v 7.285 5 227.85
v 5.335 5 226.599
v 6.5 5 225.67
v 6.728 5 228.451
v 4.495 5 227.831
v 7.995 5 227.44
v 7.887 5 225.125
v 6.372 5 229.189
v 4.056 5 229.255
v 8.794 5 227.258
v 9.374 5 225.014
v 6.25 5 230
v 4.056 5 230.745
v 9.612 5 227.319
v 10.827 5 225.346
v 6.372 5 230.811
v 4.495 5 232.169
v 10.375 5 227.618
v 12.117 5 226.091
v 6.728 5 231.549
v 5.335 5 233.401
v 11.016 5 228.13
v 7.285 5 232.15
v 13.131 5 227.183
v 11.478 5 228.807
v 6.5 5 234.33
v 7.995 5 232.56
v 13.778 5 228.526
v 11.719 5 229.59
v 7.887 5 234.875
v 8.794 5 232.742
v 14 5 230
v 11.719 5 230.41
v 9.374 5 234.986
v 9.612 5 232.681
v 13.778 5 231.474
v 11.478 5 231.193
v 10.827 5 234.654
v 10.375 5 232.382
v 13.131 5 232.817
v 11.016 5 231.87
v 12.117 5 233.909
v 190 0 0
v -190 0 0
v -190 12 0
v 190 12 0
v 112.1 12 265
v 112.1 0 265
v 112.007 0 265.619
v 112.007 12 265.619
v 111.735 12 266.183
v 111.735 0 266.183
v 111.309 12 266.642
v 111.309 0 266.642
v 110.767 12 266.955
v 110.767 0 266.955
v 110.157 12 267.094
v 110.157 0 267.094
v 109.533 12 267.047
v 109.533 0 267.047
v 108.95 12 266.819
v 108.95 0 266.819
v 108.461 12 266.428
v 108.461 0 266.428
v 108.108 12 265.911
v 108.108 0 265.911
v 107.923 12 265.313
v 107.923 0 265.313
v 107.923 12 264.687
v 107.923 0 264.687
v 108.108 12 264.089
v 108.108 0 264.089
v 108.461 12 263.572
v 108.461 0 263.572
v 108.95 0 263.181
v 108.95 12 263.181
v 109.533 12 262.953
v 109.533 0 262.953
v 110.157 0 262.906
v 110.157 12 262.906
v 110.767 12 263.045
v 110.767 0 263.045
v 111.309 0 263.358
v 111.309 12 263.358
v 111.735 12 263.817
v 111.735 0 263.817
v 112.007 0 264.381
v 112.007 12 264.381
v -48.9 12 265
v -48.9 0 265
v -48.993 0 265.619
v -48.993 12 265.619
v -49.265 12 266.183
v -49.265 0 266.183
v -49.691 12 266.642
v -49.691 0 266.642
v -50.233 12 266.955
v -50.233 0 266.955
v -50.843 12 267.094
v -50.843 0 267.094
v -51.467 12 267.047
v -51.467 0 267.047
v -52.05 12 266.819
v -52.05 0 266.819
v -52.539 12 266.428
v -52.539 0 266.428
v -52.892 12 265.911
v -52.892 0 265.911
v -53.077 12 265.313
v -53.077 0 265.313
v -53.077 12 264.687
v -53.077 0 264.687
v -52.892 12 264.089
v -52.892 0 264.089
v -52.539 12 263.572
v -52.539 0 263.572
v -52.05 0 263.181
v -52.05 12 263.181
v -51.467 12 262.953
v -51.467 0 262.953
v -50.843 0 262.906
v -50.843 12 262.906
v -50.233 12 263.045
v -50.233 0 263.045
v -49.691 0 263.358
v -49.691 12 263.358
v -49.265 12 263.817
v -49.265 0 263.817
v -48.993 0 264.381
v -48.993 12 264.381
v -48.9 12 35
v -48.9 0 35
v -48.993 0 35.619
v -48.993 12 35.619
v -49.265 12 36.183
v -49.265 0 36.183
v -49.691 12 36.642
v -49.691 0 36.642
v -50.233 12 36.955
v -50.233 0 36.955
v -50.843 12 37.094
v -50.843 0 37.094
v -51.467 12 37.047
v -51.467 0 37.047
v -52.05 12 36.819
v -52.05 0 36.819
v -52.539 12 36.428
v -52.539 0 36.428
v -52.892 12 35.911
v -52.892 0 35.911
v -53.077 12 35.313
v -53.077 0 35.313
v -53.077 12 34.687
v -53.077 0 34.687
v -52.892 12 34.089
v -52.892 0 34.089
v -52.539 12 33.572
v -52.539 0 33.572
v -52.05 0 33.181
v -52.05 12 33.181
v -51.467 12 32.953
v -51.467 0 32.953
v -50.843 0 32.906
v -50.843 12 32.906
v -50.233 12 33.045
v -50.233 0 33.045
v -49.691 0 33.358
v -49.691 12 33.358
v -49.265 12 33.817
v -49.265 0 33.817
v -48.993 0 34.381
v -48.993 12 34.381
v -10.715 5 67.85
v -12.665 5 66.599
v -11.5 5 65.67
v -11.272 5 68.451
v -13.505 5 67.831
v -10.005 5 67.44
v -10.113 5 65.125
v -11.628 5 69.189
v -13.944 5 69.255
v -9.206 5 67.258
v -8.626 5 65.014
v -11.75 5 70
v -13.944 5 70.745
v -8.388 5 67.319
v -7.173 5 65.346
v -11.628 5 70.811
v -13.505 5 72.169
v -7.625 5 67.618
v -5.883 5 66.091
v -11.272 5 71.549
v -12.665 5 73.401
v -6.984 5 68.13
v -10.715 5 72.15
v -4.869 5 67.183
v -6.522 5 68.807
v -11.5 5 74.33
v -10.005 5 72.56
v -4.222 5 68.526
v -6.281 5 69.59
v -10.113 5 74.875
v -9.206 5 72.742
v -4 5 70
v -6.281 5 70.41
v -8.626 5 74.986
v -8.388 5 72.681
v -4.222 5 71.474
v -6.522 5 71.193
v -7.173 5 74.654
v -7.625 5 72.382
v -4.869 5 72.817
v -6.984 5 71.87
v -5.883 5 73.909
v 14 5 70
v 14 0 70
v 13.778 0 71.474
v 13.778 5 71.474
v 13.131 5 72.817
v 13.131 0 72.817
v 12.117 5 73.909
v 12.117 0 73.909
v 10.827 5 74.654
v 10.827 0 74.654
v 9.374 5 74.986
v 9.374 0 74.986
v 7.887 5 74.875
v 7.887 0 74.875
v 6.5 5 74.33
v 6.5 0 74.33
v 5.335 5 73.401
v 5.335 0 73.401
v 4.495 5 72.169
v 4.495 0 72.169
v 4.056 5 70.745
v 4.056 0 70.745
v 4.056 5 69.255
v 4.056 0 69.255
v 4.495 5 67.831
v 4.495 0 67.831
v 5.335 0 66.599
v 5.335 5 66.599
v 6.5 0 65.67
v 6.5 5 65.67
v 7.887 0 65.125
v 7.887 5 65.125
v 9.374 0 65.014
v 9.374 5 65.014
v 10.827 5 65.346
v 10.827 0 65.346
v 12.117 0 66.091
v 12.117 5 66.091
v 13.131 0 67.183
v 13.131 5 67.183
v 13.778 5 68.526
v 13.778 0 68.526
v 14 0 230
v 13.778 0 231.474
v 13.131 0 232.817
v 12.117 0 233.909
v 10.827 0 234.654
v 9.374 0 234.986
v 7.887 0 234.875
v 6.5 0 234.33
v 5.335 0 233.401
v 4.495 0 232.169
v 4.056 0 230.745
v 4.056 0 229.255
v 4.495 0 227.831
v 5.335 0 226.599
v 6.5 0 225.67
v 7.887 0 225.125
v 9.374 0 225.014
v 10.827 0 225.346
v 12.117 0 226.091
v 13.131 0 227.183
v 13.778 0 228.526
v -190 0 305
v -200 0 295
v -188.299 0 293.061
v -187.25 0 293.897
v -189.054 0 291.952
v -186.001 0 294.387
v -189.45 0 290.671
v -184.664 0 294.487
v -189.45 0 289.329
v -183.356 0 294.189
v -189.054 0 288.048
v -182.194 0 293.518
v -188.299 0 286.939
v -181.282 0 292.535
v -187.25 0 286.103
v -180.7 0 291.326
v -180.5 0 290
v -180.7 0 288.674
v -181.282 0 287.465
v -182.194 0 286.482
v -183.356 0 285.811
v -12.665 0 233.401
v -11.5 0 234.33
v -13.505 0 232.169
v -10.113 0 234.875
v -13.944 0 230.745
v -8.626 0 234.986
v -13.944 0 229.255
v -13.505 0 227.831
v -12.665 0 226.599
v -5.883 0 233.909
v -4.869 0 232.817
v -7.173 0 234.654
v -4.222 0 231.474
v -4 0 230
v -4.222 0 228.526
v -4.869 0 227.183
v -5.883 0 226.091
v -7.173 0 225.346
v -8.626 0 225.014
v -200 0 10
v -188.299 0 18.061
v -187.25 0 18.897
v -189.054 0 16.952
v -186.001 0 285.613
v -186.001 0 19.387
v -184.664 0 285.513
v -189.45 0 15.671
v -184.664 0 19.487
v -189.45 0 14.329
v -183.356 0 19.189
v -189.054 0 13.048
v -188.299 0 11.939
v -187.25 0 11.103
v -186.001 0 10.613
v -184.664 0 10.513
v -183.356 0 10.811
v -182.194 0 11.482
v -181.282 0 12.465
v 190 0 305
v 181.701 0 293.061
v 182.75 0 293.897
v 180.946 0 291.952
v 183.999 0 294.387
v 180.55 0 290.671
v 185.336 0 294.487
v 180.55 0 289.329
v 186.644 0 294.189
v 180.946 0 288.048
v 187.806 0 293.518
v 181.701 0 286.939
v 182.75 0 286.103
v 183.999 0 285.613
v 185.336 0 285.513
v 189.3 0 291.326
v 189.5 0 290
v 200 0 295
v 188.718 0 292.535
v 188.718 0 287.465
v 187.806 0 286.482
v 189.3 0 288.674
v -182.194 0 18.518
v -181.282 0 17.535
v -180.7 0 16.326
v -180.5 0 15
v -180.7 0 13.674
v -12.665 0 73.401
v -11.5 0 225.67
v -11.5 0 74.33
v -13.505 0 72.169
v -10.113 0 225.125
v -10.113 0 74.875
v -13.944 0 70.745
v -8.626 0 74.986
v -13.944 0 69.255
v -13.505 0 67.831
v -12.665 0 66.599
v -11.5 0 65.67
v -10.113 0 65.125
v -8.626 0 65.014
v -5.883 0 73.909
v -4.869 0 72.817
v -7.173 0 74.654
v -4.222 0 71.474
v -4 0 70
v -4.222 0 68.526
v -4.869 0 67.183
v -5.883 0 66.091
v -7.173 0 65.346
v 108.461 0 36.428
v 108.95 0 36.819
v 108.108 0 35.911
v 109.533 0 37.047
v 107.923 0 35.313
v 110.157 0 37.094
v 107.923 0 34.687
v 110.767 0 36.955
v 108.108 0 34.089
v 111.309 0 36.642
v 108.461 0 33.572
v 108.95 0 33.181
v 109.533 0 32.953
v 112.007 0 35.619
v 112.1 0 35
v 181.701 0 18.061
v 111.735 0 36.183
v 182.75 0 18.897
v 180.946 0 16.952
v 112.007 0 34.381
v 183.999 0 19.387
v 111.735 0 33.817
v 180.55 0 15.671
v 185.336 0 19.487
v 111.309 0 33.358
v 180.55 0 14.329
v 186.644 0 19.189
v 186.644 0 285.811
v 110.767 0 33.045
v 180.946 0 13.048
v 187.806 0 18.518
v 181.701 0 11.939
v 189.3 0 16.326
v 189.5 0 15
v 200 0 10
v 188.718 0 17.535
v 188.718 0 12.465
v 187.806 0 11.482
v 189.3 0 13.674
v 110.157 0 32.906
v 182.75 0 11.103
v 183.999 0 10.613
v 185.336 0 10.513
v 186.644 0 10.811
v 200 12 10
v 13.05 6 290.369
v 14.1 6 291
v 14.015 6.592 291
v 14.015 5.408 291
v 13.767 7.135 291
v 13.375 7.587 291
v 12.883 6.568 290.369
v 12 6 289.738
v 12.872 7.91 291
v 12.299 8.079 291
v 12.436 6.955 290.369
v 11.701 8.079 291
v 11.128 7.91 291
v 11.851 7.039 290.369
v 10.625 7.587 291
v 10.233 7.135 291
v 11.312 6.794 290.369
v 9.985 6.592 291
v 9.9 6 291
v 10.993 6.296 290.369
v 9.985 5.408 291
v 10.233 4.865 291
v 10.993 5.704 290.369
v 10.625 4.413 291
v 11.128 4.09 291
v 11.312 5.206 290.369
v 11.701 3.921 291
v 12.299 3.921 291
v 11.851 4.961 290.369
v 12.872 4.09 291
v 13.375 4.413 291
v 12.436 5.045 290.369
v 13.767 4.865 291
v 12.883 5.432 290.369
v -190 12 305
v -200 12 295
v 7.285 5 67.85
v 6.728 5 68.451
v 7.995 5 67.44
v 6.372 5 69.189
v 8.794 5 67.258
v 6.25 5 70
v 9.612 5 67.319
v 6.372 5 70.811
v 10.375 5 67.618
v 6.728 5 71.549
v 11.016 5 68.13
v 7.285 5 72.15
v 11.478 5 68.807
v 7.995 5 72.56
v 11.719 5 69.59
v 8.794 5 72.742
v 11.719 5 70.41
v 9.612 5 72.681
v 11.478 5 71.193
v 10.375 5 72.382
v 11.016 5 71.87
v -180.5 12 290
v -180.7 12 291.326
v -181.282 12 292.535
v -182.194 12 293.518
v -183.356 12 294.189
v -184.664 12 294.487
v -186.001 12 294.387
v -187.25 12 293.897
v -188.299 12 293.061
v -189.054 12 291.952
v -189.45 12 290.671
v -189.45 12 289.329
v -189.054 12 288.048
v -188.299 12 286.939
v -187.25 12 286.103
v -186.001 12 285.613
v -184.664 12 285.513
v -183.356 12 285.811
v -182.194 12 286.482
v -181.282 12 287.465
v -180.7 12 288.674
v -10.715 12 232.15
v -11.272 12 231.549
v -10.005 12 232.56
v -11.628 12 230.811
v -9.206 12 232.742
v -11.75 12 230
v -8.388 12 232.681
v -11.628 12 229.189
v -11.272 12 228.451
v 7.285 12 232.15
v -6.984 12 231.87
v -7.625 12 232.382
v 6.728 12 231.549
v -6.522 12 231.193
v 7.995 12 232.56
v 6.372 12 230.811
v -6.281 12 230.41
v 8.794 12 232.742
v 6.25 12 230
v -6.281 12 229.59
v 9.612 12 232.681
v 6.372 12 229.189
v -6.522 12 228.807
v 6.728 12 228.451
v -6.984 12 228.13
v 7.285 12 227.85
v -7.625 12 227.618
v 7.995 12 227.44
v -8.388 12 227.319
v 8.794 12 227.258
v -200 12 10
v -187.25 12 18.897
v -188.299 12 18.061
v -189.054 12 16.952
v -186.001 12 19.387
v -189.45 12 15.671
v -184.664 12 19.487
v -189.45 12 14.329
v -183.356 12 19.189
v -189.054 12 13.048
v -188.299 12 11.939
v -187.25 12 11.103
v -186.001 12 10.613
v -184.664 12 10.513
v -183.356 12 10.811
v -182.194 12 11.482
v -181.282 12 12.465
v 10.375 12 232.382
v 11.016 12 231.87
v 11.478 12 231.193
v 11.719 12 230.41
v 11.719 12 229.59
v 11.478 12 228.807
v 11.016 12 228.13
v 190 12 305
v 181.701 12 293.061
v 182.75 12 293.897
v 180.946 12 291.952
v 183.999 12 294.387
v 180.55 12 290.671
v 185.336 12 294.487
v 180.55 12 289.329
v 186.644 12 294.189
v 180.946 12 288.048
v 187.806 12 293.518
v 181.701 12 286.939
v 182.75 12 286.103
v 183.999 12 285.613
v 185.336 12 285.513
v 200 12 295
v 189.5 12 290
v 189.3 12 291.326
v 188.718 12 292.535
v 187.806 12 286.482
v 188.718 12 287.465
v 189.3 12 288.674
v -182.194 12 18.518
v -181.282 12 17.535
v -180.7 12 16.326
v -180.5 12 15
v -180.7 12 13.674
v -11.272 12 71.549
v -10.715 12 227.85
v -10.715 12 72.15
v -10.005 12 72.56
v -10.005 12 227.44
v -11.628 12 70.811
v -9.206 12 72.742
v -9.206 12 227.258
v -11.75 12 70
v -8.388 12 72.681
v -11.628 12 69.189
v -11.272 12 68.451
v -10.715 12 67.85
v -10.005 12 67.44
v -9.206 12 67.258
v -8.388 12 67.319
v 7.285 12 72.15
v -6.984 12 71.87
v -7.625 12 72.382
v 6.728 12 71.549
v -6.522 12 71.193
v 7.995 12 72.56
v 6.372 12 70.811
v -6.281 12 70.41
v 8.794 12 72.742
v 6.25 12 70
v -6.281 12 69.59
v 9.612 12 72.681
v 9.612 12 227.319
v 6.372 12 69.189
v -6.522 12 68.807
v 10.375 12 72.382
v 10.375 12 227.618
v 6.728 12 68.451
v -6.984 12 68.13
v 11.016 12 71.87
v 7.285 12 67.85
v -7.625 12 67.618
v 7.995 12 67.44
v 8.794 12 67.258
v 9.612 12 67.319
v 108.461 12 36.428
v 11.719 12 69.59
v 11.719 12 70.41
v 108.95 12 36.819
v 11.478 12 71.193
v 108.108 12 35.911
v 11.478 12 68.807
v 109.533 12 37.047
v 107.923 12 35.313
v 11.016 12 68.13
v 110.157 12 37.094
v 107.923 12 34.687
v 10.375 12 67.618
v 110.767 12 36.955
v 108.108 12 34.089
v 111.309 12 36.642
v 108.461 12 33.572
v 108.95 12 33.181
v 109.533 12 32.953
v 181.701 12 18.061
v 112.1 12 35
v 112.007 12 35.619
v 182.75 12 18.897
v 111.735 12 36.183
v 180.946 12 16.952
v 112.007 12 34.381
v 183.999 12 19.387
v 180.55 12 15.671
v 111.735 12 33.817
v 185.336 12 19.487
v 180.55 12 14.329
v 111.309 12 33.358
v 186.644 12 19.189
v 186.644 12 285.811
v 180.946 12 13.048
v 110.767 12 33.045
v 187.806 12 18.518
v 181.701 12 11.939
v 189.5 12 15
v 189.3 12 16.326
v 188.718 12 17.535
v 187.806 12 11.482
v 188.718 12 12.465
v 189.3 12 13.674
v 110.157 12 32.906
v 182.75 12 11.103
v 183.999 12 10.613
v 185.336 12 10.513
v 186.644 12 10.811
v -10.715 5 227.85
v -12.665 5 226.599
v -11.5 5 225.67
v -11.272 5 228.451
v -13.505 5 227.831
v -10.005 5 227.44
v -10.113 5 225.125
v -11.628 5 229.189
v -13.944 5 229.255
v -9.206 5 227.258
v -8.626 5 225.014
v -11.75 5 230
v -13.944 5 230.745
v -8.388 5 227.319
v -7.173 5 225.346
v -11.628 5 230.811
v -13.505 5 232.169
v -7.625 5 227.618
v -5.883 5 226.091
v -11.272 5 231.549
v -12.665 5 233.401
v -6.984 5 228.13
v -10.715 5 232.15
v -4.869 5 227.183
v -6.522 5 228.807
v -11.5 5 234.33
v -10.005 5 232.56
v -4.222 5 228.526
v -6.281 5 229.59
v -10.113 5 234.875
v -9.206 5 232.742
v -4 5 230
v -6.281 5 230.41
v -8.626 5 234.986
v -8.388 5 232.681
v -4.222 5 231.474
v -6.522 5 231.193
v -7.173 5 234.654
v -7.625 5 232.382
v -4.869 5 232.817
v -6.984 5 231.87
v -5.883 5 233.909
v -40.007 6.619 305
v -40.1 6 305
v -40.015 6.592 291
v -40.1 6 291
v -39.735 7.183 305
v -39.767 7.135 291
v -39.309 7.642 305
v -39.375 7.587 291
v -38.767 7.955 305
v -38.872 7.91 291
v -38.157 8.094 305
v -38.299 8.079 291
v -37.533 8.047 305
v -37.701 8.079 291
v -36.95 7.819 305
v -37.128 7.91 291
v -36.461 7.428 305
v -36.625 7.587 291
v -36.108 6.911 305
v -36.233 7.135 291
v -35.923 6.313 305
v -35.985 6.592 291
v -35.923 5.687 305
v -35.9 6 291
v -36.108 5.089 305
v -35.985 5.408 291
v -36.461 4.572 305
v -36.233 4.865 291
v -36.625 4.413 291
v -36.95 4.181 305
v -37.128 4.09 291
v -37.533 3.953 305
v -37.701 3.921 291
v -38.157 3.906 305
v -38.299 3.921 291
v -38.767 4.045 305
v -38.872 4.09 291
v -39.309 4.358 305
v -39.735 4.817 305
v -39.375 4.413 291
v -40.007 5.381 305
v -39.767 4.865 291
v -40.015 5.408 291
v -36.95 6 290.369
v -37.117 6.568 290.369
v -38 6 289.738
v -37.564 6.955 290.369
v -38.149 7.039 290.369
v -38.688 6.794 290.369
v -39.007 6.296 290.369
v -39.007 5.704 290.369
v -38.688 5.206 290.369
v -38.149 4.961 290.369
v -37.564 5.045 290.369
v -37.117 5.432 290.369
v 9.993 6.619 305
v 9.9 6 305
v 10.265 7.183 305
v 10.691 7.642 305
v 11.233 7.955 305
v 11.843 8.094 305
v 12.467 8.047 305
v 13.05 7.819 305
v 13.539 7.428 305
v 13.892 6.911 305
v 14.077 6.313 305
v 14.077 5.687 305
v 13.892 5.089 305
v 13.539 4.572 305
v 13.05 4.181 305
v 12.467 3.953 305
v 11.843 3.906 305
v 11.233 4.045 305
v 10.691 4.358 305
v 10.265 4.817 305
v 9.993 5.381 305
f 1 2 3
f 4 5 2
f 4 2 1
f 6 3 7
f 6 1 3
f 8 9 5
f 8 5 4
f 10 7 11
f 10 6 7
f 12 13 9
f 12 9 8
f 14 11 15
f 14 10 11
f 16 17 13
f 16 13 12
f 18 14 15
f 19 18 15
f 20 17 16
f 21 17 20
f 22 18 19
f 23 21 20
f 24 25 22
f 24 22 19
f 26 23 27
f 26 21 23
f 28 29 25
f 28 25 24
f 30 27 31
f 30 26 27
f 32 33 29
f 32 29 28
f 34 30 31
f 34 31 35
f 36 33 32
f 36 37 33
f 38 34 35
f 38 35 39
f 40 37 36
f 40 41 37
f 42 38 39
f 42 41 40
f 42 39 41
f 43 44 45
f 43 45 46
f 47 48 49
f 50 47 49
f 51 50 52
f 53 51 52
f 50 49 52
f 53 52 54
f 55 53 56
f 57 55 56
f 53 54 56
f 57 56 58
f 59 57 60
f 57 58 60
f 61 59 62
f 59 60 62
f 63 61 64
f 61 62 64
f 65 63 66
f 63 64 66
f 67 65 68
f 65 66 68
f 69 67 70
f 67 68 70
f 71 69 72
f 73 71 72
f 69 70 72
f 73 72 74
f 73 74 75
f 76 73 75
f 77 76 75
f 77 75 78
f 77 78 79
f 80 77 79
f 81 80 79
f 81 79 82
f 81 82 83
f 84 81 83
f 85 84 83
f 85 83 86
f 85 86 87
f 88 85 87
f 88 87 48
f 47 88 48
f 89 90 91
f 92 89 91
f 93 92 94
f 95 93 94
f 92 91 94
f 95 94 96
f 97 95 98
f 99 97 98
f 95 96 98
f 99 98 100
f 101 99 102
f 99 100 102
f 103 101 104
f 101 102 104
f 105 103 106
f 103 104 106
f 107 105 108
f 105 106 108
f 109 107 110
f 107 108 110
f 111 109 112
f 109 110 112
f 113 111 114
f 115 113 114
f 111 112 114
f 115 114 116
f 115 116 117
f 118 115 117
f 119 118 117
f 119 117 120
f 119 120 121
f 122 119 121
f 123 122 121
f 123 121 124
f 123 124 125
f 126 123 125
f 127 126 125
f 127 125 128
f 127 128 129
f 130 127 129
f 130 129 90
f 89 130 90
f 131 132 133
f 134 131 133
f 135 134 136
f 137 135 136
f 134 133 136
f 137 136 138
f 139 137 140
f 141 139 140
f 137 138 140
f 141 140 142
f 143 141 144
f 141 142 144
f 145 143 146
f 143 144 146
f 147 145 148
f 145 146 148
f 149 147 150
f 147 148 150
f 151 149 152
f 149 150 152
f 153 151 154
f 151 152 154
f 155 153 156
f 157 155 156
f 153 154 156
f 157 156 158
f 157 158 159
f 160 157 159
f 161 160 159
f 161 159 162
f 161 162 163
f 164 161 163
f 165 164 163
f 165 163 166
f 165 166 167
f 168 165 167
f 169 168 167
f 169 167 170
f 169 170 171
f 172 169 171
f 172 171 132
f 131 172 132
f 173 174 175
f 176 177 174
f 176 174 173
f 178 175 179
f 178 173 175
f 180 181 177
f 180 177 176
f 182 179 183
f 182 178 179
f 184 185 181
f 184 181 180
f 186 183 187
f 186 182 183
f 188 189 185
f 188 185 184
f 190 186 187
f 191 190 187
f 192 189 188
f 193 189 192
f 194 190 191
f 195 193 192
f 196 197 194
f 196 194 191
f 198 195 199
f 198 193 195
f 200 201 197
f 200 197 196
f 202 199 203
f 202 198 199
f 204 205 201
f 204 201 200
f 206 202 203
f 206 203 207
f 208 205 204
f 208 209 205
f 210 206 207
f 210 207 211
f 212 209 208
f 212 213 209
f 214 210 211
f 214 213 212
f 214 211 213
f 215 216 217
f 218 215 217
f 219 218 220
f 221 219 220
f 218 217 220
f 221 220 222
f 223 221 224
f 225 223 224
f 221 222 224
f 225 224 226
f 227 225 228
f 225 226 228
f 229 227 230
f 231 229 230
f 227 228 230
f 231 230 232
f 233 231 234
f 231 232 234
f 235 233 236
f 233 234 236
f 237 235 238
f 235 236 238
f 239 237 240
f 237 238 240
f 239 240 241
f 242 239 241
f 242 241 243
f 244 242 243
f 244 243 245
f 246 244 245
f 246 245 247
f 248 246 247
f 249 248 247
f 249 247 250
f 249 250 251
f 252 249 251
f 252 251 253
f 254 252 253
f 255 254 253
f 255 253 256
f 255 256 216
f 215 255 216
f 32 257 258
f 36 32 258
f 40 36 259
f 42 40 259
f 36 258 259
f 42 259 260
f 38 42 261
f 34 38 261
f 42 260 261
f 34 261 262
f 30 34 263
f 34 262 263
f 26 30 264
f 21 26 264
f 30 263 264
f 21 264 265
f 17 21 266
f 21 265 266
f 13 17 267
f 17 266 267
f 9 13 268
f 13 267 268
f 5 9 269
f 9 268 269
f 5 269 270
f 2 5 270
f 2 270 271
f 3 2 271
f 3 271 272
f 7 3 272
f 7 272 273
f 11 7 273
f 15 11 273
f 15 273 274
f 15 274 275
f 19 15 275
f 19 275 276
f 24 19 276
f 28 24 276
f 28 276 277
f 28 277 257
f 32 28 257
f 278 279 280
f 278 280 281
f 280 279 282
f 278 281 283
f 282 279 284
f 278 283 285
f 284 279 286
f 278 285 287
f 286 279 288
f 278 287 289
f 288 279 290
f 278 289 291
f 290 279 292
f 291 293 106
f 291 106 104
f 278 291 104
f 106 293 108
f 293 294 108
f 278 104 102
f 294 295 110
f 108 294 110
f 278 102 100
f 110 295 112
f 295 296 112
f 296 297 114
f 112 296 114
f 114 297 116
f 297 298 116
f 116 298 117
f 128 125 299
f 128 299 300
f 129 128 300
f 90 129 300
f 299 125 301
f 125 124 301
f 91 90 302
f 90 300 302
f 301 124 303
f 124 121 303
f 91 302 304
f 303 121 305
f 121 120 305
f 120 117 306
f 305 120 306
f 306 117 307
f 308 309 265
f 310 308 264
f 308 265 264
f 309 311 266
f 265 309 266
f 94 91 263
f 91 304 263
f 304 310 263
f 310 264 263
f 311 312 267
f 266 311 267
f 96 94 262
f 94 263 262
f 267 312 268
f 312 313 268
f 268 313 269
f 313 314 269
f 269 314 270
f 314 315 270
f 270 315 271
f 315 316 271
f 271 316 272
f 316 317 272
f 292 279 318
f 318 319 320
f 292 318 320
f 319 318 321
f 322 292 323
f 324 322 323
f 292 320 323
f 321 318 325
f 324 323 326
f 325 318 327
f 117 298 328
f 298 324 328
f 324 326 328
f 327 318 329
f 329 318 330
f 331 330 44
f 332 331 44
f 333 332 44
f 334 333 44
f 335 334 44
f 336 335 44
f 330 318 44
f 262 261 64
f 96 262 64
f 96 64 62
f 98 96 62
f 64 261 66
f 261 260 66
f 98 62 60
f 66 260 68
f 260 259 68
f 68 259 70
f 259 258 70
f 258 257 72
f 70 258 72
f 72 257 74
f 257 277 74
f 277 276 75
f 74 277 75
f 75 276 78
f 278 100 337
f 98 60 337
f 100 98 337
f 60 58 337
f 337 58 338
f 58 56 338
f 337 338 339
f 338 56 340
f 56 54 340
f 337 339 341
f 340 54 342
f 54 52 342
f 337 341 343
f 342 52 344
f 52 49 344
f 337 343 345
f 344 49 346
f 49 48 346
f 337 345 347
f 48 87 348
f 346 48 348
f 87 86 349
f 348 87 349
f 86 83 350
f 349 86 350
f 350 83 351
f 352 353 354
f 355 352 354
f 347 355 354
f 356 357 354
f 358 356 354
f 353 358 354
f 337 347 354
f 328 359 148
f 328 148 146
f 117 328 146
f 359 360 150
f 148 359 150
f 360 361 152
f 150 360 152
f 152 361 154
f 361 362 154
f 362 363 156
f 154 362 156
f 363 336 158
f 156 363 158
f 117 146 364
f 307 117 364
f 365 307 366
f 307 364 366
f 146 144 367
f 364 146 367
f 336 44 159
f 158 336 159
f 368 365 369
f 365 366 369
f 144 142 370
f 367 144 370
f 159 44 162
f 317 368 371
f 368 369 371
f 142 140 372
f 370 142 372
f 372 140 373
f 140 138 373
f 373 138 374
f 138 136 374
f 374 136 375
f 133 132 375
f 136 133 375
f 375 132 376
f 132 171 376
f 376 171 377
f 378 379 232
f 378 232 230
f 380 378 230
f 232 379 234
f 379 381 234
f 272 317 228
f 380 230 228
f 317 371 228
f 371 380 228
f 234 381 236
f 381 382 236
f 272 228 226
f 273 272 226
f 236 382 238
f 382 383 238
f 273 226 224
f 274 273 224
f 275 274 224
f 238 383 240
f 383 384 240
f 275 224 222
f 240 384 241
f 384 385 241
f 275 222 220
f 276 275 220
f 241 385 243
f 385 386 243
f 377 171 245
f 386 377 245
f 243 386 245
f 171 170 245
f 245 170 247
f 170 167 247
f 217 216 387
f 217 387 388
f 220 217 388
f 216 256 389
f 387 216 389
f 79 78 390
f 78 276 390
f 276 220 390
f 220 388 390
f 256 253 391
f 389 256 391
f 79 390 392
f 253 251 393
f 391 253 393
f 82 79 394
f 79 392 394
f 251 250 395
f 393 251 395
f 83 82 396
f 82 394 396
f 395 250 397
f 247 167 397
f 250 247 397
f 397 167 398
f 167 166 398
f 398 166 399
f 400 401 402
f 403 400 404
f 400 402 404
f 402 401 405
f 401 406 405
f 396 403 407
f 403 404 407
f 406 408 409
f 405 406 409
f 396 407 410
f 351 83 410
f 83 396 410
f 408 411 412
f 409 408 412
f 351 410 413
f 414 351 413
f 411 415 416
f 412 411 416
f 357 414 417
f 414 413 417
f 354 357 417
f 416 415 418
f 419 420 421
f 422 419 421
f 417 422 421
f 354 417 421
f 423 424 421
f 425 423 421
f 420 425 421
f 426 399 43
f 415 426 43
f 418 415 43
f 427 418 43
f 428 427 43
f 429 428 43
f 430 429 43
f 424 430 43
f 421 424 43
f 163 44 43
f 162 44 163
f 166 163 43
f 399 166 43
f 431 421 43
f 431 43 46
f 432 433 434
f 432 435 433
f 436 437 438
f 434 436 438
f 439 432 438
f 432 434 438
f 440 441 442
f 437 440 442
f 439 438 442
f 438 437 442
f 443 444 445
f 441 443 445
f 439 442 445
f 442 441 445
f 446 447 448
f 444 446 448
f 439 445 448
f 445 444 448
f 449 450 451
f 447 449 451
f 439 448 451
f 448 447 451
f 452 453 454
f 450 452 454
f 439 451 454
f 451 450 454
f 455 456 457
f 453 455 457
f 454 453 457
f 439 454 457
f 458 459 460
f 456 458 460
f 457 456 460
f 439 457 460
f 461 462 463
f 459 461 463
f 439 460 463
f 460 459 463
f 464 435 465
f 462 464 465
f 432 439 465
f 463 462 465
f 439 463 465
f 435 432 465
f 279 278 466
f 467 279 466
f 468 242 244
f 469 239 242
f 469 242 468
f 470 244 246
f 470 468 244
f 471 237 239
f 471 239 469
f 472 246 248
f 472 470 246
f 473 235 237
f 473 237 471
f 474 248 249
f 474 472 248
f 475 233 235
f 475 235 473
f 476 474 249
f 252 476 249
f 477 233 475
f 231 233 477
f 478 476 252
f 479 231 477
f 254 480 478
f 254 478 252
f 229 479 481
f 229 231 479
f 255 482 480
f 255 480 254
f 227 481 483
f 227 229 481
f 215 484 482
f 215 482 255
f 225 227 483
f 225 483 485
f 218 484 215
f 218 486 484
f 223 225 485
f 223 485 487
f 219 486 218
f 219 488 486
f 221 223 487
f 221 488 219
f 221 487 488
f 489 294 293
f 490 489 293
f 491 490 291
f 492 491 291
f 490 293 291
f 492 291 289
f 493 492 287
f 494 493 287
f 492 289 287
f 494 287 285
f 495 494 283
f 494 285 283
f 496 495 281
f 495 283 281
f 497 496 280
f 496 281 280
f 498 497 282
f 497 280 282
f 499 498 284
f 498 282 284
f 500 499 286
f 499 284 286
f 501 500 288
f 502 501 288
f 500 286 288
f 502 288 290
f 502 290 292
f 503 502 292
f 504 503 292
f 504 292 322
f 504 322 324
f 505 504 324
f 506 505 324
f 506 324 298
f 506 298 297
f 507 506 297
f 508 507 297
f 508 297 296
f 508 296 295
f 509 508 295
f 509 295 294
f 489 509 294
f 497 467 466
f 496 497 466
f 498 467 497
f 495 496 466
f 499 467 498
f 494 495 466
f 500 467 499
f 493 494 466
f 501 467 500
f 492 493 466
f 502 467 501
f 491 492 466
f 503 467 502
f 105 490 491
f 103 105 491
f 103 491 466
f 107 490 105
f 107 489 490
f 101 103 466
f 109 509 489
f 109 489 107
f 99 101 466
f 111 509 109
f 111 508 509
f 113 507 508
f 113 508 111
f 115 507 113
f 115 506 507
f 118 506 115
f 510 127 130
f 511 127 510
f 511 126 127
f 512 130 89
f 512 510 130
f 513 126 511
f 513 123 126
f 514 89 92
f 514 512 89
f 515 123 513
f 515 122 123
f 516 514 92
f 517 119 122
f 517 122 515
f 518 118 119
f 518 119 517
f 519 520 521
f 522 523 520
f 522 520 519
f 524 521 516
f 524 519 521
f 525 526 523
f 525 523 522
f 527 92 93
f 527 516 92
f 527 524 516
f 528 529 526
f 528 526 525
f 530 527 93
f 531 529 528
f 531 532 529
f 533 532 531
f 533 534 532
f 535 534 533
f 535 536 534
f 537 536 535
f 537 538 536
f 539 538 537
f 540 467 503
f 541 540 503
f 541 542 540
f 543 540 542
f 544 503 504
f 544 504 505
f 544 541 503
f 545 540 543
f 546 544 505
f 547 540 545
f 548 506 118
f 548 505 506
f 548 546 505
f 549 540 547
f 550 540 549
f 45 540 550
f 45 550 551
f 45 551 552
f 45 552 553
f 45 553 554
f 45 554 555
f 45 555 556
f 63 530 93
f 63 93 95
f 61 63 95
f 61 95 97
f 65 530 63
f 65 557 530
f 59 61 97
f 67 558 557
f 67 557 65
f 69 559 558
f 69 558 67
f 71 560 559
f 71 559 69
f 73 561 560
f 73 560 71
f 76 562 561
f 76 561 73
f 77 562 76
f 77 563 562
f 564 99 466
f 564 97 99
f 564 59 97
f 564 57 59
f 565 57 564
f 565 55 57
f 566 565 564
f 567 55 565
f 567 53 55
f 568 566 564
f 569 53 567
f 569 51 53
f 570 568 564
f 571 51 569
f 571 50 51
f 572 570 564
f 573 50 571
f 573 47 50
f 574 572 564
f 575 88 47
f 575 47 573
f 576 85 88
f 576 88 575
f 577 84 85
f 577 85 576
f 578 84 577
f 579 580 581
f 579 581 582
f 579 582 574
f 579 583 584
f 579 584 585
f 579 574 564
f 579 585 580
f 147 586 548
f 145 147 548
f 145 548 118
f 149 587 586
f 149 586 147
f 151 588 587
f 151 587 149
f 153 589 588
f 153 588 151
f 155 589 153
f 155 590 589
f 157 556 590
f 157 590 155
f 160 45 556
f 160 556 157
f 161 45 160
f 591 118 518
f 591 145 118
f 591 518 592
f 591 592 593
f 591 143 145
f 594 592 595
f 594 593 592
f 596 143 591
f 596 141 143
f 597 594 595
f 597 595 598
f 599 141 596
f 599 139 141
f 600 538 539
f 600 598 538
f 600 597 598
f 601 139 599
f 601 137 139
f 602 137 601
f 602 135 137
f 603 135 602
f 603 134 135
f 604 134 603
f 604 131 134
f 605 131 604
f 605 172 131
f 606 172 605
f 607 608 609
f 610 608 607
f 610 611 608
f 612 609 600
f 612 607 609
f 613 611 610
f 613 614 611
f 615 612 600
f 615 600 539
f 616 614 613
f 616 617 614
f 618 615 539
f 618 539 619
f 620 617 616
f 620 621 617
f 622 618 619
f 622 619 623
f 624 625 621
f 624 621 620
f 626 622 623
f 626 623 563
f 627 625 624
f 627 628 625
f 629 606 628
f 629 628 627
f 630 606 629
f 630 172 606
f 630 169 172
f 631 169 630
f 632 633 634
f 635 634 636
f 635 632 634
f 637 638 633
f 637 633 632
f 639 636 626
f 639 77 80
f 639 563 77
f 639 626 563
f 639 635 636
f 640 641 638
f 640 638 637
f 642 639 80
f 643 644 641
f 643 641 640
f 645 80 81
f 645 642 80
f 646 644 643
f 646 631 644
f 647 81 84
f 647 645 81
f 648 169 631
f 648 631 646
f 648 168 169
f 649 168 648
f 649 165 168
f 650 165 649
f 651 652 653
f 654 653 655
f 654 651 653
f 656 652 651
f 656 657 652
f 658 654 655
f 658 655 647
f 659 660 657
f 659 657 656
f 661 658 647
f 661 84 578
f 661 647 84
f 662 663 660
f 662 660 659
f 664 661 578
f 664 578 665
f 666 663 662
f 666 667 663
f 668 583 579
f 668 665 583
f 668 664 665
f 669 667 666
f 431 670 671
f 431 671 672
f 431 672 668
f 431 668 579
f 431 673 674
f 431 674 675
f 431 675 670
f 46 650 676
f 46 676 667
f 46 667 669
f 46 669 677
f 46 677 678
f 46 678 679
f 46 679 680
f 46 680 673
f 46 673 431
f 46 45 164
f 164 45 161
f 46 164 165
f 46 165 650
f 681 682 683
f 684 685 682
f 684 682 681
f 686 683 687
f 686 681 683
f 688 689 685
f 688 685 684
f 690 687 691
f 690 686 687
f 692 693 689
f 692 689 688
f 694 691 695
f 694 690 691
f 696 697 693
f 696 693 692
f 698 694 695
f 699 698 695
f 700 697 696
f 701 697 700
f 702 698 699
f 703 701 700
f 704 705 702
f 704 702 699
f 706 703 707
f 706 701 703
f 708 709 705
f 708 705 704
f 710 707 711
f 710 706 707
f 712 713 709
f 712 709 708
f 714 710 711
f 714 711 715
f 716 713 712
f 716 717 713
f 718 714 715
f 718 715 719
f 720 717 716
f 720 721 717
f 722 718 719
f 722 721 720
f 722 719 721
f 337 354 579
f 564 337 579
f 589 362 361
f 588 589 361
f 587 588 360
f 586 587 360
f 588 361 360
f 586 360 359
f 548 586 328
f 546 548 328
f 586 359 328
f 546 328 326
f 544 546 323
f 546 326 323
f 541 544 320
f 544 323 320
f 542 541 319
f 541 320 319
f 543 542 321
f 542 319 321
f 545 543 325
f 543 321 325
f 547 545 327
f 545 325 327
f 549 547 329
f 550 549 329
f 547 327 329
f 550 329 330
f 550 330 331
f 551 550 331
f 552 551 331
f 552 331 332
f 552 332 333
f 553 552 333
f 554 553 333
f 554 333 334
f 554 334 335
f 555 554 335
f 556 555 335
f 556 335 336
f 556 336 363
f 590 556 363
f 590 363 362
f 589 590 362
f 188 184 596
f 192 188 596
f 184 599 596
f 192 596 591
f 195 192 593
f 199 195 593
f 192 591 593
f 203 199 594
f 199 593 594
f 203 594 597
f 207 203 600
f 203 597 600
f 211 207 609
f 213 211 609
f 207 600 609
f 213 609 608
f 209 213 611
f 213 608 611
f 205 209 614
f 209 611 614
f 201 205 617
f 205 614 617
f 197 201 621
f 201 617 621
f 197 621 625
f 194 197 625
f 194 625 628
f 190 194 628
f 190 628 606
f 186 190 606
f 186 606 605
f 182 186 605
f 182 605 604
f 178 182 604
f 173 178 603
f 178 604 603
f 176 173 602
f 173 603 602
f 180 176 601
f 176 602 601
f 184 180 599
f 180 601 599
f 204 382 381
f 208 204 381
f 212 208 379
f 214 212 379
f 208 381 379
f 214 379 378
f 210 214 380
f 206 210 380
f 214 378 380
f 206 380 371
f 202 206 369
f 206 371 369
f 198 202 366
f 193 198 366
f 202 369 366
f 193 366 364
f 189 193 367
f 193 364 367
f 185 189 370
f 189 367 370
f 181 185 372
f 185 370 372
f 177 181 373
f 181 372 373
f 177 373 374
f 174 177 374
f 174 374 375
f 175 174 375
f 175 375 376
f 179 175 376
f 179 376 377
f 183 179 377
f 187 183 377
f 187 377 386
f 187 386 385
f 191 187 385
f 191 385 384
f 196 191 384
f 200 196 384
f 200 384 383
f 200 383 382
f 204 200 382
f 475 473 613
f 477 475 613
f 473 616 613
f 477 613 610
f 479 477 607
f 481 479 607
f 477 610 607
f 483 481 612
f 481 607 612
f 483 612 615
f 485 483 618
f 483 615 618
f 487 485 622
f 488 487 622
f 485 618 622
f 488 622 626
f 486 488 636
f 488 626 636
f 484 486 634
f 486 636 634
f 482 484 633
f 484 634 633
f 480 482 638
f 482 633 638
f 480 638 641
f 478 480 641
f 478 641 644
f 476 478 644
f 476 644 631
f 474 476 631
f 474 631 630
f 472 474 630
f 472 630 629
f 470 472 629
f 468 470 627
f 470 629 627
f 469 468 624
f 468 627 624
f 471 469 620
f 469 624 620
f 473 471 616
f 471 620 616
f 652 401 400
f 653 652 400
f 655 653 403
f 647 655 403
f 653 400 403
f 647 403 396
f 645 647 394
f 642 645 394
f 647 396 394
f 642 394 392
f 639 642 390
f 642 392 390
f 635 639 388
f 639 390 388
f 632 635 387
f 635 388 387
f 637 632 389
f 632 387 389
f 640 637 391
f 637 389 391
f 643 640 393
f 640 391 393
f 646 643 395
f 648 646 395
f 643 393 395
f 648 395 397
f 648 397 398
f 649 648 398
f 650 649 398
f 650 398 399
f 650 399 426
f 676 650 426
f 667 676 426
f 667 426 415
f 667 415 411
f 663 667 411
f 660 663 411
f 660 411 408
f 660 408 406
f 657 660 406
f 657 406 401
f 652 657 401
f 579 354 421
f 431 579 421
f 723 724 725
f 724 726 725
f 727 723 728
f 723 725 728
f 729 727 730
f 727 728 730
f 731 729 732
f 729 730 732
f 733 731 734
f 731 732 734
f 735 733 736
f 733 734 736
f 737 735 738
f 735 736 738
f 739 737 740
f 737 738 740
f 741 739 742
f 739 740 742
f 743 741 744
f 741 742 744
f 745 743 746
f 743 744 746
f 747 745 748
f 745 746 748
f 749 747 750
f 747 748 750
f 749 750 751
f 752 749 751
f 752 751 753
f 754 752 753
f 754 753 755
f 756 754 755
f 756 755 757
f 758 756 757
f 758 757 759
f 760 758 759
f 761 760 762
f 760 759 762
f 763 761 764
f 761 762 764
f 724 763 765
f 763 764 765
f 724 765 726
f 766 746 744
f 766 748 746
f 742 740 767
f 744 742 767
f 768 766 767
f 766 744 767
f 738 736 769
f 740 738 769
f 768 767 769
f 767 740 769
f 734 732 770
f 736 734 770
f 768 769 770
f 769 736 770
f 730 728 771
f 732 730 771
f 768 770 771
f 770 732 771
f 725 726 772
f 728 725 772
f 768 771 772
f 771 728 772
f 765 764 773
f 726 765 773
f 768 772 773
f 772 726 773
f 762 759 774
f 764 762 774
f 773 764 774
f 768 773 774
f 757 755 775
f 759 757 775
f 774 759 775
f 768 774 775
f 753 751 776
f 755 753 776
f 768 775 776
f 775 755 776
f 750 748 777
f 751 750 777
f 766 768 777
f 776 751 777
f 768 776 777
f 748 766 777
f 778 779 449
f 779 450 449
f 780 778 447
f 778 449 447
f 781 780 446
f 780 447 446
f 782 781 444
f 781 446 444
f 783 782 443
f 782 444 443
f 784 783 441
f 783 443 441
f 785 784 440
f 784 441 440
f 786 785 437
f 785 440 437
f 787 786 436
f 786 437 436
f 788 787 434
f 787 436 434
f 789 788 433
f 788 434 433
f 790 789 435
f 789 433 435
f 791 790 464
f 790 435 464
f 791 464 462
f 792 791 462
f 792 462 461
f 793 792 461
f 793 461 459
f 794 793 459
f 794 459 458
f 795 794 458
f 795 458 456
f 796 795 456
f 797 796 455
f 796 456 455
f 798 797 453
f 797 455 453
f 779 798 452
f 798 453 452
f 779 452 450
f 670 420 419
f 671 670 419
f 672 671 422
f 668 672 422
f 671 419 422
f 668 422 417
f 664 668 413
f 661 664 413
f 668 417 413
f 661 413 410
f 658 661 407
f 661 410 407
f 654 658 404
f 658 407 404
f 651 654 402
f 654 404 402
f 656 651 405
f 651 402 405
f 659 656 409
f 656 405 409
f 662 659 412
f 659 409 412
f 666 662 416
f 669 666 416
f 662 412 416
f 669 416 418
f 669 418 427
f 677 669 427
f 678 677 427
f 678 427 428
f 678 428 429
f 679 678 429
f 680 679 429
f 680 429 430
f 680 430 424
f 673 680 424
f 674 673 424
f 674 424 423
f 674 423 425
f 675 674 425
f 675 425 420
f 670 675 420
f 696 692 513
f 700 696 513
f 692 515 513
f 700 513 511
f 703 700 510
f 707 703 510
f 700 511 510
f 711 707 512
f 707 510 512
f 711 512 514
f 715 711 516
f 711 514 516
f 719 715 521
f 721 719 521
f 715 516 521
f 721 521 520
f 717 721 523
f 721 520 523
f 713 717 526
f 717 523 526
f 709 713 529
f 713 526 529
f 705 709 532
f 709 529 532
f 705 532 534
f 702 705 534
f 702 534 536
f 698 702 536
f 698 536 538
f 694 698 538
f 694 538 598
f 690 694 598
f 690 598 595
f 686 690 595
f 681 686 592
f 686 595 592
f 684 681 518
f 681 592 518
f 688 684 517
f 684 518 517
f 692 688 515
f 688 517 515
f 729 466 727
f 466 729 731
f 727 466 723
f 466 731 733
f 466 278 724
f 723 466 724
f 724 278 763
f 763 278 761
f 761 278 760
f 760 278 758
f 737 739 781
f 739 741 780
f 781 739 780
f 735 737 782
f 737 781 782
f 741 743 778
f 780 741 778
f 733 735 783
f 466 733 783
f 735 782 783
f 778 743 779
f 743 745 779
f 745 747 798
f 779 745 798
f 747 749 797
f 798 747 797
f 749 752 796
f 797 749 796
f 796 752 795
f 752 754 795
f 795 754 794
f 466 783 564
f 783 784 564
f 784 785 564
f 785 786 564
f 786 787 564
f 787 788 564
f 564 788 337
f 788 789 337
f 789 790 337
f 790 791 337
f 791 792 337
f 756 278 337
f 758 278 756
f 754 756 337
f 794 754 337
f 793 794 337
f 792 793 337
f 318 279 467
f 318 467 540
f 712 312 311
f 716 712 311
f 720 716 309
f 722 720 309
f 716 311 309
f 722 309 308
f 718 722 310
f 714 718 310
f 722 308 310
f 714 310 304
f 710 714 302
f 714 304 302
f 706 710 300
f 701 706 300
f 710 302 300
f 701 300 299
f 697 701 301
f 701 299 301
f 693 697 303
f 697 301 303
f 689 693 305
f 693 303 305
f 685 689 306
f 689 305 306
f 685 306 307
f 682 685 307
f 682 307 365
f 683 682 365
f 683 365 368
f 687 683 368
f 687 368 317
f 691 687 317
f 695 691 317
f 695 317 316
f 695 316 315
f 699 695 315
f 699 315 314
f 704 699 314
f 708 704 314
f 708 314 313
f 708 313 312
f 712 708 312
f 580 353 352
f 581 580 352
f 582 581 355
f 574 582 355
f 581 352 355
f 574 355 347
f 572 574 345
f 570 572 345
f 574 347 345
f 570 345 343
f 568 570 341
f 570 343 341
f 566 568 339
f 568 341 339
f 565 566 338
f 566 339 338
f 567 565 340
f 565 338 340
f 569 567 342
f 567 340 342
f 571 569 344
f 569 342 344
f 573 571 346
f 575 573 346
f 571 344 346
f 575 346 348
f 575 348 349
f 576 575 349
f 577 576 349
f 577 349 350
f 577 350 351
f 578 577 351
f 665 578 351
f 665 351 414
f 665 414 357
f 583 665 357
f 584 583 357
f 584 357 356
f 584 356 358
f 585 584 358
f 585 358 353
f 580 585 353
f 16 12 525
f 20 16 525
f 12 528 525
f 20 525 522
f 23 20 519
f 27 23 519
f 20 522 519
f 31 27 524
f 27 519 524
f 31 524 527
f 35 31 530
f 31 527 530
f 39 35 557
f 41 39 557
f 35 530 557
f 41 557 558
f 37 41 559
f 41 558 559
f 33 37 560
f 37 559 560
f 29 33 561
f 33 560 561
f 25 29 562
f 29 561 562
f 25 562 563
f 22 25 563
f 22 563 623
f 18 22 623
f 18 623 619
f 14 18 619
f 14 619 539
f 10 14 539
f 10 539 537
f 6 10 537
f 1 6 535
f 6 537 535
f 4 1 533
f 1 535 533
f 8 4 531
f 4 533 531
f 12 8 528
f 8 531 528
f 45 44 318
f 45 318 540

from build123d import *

# Parameters (mm, degrees)
SKETCH1_W                                       = 400
SKETCH1_H                                       = 305
BOSS_EXTRUDE1_DEPTH                             = 12
CBORE_FOR_M5_SOCKET_HEAD_CAP_SCREW1_D           = 5.5
CBORE_FOR_M5_SOCKET_HEAD_CAP_SCREW1_CBORE_D     = 10
CBORE_FOR_M5_SOCKET_HEAD_CAP_SCREW1_CBORE_DEPTH = 5
M5X0_8_TAPPED_HOLE1_D                           = 4.2
M5X0_8_TAPPED_HOLE1_DEPTH                       = 14
M5X0_8_TAPPED_HOLE1_TIP                         = 1.2618073
CHAMFER1_SIZE                                   = 10
M8_CLEARANCE_HOLE1_D                            = 9
M5X0_8_TAPPED_HOLE2_D                           = 4.2


with BuildPart() as part:
    # Sketch1 → Boss-Extrude1 (new body)
    with BuildSketch(Plane(origin=(0, 0, 0), x_dir=(1, 0, 0), z_dir=(0, 1, 0))):
        with Locations((0, -152.5)):
            Rectangle(SKETCH1_W, SKETCH1_H)
    extrude(amount=BOSS_EXTRUDE1_DEPTH)

    # CBORE for M5 Socket Head Cap Screw1 (through all)
    with Locations(Plane.XZ):
        with Locations((-9, 230), (-9, 70), (9, 70), (9, 230)):
            CounterBoreHole(CBORE_FOR_M5_SOCKET_HEAD_CAP_SCREW1_D / 2, CBORE_FOR_M5_SOCKET_HEAD_CAP_SCREW1_CBORE_D / 2, CBORE_FOR_M5_SOCKET_HEAD_CAP_SCREW1_CBORE_DEPTH)

    # M5x0.8 Tapped Hole1
    with Locations(Plane.XY.offset(305)):
        with Locations((-38, 6), (12, 6)):
            Hole(M5X0_8_TAPPED_HOLE1_D / 2, depth=M5X0_8_TAPPED_HOLE1_DEPTH)
            with Locations((0, 0, -(M5X0_8_TAPPED_HOLE1_DEPTH + M5X0_8_TAPPED_HOLE1_TIP / 2))):  # 118° drill point
                Cone(0, M5X0_8_TAPPED_HOLE1_D / 2, M5X0_8_TAPPED_HOLE1_TIP, mode=Mode.SUBTRACT)

    # Chamfer1
    chamfer1_edges = [part.edges().sort_by_distance(p)[0] for p in [
        (-200, 6, 0),
        (200, 6, 0),
        (200, 6, 305),
        (-200, 6, 305),
    ]]
    chamfer(chamfer1_edges, length=CHAMFER1_SIZE)

    # M8 Clearance Hole1 (through all)
    with Locations(Plane(origin=(0, 12, 0), x_dir=(-1, 0, 0), z_dir=(0, 1, 0))):
        with Locations((185, 290), (185, 15), (-185, 15), (-185, 290)):
            Hole(M8_CLEARANCE_HOLE1_D / 2)

    # M5x0.8 Tapped Hole2 (through all)
    with Locations(Plane(origin=(0, 12, 0), x_dir=(-1, 0, 0), z_dir=(0, 1, 0))):
        with Locations((51, 265), (51, 35), (-110, 265), (-110, 35)):
            Hole(M5X0_8_TAPPED_HOLE2_D / 2)


solid = part.part
